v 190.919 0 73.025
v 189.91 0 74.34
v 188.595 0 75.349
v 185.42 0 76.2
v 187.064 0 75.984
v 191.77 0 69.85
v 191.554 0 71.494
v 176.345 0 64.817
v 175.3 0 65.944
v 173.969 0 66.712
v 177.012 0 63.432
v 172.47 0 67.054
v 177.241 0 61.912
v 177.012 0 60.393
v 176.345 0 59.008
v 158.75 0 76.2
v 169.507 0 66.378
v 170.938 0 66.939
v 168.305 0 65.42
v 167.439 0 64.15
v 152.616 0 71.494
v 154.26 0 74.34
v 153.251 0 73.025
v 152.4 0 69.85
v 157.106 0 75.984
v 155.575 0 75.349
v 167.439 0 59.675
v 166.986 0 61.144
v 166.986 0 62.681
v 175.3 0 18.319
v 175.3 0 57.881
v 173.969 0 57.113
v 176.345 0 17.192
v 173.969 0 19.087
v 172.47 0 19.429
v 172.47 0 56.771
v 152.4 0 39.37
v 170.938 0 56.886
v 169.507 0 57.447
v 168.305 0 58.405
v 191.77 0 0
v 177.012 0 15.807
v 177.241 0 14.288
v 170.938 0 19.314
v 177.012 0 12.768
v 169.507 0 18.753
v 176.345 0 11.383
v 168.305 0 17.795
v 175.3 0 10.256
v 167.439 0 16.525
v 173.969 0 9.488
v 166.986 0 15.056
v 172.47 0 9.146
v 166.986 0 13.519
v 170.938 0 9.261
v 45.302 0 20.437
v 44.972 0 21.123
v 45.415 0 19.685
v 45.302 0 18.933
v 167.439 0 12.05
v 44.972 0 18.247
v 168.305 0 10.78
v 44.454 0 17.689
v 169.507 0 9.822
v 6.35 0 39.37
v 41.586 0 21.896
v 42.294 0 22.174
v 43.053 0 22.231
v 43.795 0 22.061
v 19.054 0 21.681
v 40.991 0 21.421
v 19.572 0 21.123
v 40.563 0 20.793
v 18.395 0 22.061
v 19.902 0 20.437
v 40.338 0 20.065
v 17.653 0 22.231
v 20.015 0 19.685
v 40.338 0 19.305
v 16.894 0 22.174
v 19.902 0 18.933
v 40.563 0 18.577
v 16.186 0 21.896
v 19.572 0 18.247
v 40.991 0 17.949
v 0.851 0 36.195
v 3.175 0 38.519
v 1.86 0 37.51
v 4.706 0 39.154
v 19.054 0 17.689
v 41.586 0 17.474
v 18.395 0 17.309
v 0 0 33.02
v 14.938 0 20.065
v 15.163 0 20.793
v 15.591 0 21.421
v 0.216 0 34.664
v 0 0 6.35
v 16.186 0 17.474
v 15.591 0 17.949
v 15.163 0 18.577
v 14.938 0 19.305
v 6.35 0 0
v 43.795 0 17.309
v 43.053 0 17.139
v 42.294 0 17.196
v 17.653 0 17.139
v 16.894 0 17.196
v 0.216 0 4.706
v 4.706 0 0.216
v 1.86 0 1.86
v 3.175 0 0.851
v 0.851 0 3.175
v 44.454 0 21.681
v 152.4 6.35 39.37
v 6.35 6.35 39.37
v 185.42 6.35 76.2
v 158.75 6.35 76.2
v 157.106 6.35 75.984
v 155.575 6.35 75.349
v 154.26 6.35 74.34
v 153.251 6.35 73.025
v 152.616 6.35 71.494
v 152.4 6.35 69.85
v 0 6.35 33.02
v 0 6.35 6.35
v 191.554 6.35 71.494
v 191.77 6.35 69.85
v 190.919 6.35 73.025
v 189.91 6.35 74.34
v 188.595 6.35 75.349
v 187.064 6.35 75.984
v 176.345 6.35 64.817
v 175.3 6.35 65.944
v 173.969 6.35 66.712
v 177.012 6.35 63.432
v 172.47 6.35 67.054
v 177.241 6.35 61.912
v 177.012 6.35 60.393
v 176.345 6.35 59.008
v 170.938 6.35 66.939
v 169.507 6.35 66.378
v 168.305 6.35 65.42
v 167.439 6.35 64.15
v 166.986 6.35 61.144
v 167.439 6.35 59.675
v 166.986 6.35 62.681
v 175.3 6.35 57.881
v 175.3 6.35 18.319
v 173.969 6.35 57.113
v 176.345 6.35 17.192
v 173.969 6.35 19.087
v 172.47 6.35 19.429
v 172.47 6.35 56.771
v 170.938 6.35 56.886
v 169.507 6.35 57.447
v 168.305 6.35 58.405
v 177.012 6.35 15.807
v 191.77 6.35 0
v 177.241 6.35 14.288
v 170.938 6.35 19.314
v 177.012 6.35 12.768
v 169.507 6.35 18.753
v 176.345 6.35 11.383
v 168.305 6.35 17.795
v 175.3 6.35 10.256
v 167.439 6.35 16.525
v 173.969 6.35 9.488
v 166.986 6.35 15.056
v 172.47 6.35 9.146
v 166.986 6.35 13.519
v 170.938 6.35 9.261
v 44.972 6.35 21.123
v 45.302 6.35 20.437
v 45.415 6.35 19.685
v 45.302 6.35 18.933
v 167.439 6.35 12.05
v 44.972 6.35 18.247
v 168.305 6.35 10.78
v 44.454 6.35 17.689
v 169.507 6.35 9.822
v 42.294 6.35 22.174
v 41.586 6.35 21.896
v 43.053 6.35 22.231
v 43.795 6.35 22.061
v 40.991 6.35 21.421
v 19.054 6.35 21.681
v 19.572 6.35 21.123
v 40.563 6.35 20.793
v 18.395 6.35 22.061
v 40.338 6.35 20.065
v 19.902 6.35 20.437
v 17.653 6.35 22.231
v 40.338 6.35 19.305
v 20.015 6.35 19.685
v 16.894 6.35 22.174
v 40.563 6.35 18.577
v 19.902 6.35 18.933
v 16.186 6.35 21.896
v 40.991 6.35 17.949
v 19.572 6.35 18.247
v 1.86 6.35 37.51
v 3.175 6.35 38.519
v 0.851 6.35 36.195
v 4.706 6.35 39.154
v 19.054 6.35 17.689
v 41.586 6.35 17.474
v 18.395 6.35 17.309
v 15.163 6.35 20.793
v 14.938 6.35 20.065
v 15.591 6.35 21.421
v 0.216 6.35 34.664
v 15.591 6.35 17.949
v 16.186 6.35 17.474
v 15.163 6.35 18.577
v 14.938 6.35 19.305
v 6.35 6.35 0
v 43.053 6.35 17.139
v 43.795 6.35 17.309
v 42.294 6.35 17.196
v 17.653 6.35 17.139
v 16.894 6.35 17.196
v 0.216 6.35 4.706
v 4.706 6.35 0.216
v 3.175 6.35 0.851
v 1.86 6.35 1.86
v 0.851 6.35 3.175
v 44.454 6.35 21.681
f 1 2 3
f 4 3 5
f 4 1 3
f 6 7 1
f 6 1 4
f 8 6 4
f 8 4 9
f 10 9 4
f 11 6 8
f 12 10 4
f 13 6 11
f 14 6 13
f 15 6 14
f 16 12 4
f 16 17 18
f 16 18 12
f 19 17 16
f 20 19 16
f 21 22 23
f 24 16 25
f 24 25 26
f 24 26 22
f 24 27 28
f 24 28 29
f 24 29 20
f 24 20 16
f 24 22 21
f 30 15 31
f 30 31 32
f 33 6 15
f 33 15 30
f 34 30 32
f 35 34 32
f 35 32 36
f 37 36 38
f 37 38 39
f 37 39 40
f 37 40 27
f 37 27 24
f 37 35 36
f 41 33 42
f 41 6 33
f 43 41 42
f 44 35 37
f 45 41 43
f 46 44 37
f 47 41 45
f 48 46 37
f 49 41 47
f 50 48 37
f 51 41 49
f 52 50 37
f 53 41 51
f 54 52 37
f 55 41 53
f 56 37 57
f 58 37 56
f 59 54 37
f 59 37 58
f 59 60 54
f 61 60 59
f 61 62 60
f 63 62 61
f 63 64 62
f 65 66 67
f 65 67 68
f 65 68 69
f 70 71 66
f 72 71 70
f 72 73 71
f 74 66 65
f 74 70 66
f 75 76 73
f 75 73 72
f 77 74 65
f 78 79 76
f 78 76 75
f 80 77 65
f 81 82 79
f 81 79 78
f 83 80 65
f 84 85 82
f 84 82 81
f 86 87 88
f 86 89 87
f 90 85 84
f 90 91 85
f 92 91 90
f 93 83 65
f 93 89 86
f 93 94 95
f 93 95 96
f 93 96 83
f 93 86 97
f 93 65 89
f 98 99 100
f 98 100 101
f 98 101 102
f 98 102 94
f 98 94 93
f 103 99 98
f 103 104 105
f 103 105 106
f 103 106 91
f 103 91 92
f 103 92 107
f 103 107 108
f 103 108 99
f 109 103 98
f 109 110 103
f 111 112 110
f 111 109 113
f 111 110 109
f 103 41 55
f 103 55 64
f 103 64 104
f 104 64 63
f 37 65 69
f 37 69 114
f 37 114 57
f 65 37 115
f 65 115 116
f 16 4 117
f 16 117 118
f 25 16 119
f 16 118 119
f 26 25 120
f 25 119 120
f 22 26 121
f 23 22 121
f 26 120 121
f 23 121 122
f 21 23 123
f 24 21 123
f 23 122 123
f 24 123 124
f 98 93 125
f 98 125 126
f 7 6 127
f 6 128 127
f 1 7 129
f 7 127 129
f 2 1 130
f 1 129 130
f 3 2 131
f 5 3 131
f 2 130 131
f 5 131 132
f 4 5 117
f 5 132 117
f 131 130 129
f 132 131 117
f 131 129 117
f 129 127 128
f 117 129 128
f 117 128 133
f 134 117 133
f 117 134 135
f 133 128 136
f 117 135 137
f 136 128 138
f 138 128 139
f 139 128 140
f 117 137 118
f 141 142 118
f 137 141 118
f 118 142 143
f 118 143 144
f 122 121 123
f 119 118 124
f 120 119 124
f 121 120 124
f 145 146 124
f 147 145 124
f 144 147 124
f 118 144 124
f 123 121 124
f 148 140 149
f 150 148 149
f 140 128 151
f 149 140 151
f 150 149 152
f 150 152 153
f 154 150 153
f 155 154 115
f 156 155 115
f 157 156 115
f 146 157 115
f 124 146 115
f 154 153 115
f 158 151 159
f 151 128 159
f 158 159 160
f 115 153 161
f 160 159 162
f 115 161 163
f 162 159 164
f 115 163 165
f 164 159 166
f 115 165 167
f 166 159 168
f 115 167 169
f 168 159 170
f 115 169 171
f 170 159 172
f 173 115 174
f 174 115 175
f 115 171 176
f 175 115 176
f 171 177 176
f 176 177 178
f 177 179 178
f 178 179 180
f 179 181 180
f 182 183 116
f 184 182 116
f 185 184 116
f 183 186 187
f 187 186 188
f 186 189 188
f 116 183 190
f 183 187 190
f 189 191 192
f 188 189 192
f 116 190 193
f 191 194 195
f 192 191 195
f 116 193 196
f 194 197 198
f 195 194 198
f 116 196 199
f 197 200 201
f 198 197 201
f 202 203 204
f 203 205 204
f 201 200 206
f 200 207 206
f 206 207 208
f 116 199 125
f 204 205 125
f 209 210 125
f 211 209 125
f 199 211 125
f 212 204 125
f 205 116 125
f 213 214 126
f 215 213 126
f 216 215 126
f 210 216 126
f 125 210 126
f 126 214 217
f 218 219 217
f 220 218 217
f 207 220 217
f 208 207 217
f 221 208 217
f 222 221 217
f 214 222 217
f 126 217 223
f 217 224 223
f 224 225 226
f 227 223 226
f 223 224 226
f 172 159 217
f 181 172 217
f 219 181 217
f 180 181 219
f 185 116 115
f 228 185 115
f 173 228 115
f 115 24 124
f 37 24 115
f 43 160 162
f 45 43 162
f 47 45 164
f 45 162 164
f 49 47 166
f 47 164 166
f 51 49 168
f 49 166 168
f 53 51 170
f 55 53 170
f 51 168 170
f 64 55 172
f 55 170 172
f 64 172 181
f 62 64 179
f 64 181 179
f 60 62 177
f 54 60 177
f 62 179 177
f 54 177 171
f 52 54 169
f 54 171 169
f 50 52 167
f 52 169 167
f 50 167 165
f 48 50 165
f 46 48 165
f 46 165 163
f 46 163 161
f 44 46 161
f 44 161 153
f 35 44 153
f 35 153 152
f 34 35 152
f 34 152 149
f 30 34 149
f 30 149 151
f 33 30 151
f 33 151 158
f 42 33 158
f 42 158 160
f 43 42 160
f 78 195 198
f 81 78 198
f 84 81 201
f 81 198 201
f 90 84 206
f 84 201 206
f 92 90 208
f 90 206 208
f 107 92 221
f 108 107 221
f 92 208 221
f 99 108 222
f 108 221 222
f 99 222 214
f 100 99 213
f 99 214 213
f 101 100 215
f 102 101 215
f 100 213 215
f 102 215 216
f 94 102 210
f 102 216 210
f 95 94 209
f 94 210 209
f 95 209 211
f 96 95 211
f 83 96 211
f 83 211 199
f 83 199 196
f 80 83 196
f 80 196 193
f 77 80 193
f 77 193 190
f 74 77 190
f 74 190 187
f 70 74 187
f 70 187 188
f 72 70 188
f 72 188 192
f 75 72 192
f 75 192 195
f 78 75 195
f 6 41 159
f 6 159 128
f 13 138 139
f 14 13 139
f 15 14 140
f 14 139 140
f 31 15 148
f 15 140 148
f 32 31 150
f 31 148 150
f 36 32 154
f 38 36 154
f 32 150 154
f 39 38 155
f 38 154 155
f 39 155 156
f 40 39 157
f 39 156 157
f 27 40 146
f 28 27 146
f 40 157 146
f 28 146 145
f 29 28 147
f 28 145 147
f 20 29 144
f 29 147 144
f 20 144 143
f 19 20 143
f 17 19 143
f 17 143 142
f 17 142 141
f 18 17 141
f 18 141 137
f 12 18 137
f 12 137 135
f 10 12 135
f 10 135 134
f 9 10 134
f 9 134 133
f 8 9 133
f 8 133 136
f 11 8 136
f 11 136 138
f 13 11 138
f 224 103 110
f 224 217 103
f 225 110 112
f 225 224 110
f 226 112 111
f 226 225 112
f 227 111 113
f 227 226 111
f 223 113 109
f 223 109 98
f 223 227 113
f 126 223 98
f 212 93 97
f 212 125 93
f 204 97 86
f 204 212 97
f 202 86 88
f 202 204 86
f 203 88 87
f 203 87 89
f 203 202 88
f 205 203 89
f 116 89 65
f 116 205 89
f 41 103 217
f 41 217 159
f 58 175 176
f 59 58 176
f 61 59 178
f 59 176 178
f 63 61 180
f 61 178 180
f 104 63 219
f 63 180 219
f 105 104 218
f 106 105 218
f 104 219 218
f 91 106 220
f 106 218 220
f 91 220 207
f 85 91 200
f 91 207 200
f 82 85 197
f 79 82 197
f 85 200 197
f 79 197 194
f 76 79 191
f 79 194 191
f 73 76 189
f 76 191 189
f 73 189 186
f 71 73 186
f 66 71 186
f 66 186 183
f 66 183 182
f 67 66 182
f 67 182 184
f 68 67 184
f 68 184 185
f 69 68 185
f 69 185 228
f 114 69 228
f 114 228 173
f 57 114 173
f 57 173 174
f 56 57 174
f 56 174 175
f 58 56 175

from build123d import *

# Parameters (mm, degrees)
BOSS_EXTRUDE1_DEPTH = 6.35
CUT_EXTRUDE1_REACH  = 8.35
SKETCH4_R           = 2.5527
SKETCH4_R_2         = 5.1562
FILLET1_R           = 6.35


with BuildPart() as part:
    # Sketch3 → Boss-Extrude1 (new body)
    with BuildSketch(Plane(origin=(0, 0, 0), x_dir=(1, 0, 0), z_dir=(0, 1, 0))):
        Polygon((0, 0), (191.77, 0), (191.77, -76.2), (152.4, -76.2), (152.4, -39.37), (0, -39.37), align=None)
    extrude(amount=BOSS_EXTRUDE1_DEPTH)

    # Sketch4 → Cut-Extrude1 (cut, up to next)
    with BuildSketch(Plane(origin=(0, 6.35, 0), x_dir=(1, 0, 0), z_dir=(0, 1, 0)), mode=Mode.PRIVATE) as cut_extrude1_sk1:
        with Locations((17.4625, -19.685)):
            Circle(SKETCH4_R)
    cut_extrude1_tool1 = extrude(cut_extrude1_sk1.sketch, amount=-CUT_EXTRUDE1_REACH, mode=Mode.PRIVATE) & part.part
    add(cut_extrude1_tool1.solids().sort_by_distance((17.4625, 6.35, 19.685))[0], mode=Mode.SUBTRACT)
    # Sketch4 → Cut-Extrude1 (cut, up to next)
    with BuildSketch(Plane(origin=(0, 6.35, 0), x_dir=(1, 0, 0), z_dir=(0, 1, 0)), mode=Mode.PRIVATE) as cut_extrude1_sk2:
        with Locations((42.8625, -19.685)):
            Circle(SKETCH4_R)
    cut_extrude1_tool2 = extrude(cut_extrude1_sk2.sketch, amount=-CUT_EXTRUDE1_REACH, mode=Mode.PRIVATE) & part.part
    add(cut_extrude1_tool2.solids().sort_by_distance((42.8625, 6.35, 19.685))[0], mode=Mode.SUBTRACT)
    # Sketch4 → Cut-Extrude1 (cut, up to next)
    with BuildSketch(Plane(origin=(0, 6.35, 0), x_dir=(1, 0, 0), z_dir=(0, 1, 0)), mode=Mode.PRIVATE) as cut_extrude1_sk3:
        with Locations((172.085, -14.2875)):
            Circle(SKETCH4_R_2)
    cut_extrude1_tool3 = extrude(cut_extrude1_sk3.sketch, amount=-CUT_EXTRUDE1_REACH, mode=Mode.PRIVATE) & part.part
    add(cut_extrude1_tool3.solids().sort_by_distance((172.085, 6.35, 14.2875))[0], mode=Mode.SUBTRACT)
    # Sketch4 → Cut-Extrude1 (cut, up to next)
    with BuildSketch(Plane(origin=(0, 6.35, 0), x_dir=(1, 0, 0), z_dir=(0, 1, 0)), mode=Mode.PRIVATE) as cut_extrude1_sk4:
        with Locations((172.085, -61.9125)):
            Circle(SKETCH4_R_2)
    cut_extrude1_tool4 = extrude(cut_extrude1_sk4.sketch, amount=-CUT_EXTRUDE1_REACH, mode=Mode.PRIVATE) & part.part
    add(cut_extrude1_tool4.solids().sort_by_distance((172.085, 6.35, 61.9125))[0], mode=Mode.SUBTRACT)

    # Fillet1
    fillet1_edges = [part.edges().sort_by_distance(p)[0] for p in [
        (0, 3.175, 0),
        (191.77, 3.175, 76.2),
        (152.4, 3.175, 76.2),
        (0, 3.175, 39.37),
    ]]
    fillet(fillet1_edges, radius=FILLET1_R)


solid = part.part
